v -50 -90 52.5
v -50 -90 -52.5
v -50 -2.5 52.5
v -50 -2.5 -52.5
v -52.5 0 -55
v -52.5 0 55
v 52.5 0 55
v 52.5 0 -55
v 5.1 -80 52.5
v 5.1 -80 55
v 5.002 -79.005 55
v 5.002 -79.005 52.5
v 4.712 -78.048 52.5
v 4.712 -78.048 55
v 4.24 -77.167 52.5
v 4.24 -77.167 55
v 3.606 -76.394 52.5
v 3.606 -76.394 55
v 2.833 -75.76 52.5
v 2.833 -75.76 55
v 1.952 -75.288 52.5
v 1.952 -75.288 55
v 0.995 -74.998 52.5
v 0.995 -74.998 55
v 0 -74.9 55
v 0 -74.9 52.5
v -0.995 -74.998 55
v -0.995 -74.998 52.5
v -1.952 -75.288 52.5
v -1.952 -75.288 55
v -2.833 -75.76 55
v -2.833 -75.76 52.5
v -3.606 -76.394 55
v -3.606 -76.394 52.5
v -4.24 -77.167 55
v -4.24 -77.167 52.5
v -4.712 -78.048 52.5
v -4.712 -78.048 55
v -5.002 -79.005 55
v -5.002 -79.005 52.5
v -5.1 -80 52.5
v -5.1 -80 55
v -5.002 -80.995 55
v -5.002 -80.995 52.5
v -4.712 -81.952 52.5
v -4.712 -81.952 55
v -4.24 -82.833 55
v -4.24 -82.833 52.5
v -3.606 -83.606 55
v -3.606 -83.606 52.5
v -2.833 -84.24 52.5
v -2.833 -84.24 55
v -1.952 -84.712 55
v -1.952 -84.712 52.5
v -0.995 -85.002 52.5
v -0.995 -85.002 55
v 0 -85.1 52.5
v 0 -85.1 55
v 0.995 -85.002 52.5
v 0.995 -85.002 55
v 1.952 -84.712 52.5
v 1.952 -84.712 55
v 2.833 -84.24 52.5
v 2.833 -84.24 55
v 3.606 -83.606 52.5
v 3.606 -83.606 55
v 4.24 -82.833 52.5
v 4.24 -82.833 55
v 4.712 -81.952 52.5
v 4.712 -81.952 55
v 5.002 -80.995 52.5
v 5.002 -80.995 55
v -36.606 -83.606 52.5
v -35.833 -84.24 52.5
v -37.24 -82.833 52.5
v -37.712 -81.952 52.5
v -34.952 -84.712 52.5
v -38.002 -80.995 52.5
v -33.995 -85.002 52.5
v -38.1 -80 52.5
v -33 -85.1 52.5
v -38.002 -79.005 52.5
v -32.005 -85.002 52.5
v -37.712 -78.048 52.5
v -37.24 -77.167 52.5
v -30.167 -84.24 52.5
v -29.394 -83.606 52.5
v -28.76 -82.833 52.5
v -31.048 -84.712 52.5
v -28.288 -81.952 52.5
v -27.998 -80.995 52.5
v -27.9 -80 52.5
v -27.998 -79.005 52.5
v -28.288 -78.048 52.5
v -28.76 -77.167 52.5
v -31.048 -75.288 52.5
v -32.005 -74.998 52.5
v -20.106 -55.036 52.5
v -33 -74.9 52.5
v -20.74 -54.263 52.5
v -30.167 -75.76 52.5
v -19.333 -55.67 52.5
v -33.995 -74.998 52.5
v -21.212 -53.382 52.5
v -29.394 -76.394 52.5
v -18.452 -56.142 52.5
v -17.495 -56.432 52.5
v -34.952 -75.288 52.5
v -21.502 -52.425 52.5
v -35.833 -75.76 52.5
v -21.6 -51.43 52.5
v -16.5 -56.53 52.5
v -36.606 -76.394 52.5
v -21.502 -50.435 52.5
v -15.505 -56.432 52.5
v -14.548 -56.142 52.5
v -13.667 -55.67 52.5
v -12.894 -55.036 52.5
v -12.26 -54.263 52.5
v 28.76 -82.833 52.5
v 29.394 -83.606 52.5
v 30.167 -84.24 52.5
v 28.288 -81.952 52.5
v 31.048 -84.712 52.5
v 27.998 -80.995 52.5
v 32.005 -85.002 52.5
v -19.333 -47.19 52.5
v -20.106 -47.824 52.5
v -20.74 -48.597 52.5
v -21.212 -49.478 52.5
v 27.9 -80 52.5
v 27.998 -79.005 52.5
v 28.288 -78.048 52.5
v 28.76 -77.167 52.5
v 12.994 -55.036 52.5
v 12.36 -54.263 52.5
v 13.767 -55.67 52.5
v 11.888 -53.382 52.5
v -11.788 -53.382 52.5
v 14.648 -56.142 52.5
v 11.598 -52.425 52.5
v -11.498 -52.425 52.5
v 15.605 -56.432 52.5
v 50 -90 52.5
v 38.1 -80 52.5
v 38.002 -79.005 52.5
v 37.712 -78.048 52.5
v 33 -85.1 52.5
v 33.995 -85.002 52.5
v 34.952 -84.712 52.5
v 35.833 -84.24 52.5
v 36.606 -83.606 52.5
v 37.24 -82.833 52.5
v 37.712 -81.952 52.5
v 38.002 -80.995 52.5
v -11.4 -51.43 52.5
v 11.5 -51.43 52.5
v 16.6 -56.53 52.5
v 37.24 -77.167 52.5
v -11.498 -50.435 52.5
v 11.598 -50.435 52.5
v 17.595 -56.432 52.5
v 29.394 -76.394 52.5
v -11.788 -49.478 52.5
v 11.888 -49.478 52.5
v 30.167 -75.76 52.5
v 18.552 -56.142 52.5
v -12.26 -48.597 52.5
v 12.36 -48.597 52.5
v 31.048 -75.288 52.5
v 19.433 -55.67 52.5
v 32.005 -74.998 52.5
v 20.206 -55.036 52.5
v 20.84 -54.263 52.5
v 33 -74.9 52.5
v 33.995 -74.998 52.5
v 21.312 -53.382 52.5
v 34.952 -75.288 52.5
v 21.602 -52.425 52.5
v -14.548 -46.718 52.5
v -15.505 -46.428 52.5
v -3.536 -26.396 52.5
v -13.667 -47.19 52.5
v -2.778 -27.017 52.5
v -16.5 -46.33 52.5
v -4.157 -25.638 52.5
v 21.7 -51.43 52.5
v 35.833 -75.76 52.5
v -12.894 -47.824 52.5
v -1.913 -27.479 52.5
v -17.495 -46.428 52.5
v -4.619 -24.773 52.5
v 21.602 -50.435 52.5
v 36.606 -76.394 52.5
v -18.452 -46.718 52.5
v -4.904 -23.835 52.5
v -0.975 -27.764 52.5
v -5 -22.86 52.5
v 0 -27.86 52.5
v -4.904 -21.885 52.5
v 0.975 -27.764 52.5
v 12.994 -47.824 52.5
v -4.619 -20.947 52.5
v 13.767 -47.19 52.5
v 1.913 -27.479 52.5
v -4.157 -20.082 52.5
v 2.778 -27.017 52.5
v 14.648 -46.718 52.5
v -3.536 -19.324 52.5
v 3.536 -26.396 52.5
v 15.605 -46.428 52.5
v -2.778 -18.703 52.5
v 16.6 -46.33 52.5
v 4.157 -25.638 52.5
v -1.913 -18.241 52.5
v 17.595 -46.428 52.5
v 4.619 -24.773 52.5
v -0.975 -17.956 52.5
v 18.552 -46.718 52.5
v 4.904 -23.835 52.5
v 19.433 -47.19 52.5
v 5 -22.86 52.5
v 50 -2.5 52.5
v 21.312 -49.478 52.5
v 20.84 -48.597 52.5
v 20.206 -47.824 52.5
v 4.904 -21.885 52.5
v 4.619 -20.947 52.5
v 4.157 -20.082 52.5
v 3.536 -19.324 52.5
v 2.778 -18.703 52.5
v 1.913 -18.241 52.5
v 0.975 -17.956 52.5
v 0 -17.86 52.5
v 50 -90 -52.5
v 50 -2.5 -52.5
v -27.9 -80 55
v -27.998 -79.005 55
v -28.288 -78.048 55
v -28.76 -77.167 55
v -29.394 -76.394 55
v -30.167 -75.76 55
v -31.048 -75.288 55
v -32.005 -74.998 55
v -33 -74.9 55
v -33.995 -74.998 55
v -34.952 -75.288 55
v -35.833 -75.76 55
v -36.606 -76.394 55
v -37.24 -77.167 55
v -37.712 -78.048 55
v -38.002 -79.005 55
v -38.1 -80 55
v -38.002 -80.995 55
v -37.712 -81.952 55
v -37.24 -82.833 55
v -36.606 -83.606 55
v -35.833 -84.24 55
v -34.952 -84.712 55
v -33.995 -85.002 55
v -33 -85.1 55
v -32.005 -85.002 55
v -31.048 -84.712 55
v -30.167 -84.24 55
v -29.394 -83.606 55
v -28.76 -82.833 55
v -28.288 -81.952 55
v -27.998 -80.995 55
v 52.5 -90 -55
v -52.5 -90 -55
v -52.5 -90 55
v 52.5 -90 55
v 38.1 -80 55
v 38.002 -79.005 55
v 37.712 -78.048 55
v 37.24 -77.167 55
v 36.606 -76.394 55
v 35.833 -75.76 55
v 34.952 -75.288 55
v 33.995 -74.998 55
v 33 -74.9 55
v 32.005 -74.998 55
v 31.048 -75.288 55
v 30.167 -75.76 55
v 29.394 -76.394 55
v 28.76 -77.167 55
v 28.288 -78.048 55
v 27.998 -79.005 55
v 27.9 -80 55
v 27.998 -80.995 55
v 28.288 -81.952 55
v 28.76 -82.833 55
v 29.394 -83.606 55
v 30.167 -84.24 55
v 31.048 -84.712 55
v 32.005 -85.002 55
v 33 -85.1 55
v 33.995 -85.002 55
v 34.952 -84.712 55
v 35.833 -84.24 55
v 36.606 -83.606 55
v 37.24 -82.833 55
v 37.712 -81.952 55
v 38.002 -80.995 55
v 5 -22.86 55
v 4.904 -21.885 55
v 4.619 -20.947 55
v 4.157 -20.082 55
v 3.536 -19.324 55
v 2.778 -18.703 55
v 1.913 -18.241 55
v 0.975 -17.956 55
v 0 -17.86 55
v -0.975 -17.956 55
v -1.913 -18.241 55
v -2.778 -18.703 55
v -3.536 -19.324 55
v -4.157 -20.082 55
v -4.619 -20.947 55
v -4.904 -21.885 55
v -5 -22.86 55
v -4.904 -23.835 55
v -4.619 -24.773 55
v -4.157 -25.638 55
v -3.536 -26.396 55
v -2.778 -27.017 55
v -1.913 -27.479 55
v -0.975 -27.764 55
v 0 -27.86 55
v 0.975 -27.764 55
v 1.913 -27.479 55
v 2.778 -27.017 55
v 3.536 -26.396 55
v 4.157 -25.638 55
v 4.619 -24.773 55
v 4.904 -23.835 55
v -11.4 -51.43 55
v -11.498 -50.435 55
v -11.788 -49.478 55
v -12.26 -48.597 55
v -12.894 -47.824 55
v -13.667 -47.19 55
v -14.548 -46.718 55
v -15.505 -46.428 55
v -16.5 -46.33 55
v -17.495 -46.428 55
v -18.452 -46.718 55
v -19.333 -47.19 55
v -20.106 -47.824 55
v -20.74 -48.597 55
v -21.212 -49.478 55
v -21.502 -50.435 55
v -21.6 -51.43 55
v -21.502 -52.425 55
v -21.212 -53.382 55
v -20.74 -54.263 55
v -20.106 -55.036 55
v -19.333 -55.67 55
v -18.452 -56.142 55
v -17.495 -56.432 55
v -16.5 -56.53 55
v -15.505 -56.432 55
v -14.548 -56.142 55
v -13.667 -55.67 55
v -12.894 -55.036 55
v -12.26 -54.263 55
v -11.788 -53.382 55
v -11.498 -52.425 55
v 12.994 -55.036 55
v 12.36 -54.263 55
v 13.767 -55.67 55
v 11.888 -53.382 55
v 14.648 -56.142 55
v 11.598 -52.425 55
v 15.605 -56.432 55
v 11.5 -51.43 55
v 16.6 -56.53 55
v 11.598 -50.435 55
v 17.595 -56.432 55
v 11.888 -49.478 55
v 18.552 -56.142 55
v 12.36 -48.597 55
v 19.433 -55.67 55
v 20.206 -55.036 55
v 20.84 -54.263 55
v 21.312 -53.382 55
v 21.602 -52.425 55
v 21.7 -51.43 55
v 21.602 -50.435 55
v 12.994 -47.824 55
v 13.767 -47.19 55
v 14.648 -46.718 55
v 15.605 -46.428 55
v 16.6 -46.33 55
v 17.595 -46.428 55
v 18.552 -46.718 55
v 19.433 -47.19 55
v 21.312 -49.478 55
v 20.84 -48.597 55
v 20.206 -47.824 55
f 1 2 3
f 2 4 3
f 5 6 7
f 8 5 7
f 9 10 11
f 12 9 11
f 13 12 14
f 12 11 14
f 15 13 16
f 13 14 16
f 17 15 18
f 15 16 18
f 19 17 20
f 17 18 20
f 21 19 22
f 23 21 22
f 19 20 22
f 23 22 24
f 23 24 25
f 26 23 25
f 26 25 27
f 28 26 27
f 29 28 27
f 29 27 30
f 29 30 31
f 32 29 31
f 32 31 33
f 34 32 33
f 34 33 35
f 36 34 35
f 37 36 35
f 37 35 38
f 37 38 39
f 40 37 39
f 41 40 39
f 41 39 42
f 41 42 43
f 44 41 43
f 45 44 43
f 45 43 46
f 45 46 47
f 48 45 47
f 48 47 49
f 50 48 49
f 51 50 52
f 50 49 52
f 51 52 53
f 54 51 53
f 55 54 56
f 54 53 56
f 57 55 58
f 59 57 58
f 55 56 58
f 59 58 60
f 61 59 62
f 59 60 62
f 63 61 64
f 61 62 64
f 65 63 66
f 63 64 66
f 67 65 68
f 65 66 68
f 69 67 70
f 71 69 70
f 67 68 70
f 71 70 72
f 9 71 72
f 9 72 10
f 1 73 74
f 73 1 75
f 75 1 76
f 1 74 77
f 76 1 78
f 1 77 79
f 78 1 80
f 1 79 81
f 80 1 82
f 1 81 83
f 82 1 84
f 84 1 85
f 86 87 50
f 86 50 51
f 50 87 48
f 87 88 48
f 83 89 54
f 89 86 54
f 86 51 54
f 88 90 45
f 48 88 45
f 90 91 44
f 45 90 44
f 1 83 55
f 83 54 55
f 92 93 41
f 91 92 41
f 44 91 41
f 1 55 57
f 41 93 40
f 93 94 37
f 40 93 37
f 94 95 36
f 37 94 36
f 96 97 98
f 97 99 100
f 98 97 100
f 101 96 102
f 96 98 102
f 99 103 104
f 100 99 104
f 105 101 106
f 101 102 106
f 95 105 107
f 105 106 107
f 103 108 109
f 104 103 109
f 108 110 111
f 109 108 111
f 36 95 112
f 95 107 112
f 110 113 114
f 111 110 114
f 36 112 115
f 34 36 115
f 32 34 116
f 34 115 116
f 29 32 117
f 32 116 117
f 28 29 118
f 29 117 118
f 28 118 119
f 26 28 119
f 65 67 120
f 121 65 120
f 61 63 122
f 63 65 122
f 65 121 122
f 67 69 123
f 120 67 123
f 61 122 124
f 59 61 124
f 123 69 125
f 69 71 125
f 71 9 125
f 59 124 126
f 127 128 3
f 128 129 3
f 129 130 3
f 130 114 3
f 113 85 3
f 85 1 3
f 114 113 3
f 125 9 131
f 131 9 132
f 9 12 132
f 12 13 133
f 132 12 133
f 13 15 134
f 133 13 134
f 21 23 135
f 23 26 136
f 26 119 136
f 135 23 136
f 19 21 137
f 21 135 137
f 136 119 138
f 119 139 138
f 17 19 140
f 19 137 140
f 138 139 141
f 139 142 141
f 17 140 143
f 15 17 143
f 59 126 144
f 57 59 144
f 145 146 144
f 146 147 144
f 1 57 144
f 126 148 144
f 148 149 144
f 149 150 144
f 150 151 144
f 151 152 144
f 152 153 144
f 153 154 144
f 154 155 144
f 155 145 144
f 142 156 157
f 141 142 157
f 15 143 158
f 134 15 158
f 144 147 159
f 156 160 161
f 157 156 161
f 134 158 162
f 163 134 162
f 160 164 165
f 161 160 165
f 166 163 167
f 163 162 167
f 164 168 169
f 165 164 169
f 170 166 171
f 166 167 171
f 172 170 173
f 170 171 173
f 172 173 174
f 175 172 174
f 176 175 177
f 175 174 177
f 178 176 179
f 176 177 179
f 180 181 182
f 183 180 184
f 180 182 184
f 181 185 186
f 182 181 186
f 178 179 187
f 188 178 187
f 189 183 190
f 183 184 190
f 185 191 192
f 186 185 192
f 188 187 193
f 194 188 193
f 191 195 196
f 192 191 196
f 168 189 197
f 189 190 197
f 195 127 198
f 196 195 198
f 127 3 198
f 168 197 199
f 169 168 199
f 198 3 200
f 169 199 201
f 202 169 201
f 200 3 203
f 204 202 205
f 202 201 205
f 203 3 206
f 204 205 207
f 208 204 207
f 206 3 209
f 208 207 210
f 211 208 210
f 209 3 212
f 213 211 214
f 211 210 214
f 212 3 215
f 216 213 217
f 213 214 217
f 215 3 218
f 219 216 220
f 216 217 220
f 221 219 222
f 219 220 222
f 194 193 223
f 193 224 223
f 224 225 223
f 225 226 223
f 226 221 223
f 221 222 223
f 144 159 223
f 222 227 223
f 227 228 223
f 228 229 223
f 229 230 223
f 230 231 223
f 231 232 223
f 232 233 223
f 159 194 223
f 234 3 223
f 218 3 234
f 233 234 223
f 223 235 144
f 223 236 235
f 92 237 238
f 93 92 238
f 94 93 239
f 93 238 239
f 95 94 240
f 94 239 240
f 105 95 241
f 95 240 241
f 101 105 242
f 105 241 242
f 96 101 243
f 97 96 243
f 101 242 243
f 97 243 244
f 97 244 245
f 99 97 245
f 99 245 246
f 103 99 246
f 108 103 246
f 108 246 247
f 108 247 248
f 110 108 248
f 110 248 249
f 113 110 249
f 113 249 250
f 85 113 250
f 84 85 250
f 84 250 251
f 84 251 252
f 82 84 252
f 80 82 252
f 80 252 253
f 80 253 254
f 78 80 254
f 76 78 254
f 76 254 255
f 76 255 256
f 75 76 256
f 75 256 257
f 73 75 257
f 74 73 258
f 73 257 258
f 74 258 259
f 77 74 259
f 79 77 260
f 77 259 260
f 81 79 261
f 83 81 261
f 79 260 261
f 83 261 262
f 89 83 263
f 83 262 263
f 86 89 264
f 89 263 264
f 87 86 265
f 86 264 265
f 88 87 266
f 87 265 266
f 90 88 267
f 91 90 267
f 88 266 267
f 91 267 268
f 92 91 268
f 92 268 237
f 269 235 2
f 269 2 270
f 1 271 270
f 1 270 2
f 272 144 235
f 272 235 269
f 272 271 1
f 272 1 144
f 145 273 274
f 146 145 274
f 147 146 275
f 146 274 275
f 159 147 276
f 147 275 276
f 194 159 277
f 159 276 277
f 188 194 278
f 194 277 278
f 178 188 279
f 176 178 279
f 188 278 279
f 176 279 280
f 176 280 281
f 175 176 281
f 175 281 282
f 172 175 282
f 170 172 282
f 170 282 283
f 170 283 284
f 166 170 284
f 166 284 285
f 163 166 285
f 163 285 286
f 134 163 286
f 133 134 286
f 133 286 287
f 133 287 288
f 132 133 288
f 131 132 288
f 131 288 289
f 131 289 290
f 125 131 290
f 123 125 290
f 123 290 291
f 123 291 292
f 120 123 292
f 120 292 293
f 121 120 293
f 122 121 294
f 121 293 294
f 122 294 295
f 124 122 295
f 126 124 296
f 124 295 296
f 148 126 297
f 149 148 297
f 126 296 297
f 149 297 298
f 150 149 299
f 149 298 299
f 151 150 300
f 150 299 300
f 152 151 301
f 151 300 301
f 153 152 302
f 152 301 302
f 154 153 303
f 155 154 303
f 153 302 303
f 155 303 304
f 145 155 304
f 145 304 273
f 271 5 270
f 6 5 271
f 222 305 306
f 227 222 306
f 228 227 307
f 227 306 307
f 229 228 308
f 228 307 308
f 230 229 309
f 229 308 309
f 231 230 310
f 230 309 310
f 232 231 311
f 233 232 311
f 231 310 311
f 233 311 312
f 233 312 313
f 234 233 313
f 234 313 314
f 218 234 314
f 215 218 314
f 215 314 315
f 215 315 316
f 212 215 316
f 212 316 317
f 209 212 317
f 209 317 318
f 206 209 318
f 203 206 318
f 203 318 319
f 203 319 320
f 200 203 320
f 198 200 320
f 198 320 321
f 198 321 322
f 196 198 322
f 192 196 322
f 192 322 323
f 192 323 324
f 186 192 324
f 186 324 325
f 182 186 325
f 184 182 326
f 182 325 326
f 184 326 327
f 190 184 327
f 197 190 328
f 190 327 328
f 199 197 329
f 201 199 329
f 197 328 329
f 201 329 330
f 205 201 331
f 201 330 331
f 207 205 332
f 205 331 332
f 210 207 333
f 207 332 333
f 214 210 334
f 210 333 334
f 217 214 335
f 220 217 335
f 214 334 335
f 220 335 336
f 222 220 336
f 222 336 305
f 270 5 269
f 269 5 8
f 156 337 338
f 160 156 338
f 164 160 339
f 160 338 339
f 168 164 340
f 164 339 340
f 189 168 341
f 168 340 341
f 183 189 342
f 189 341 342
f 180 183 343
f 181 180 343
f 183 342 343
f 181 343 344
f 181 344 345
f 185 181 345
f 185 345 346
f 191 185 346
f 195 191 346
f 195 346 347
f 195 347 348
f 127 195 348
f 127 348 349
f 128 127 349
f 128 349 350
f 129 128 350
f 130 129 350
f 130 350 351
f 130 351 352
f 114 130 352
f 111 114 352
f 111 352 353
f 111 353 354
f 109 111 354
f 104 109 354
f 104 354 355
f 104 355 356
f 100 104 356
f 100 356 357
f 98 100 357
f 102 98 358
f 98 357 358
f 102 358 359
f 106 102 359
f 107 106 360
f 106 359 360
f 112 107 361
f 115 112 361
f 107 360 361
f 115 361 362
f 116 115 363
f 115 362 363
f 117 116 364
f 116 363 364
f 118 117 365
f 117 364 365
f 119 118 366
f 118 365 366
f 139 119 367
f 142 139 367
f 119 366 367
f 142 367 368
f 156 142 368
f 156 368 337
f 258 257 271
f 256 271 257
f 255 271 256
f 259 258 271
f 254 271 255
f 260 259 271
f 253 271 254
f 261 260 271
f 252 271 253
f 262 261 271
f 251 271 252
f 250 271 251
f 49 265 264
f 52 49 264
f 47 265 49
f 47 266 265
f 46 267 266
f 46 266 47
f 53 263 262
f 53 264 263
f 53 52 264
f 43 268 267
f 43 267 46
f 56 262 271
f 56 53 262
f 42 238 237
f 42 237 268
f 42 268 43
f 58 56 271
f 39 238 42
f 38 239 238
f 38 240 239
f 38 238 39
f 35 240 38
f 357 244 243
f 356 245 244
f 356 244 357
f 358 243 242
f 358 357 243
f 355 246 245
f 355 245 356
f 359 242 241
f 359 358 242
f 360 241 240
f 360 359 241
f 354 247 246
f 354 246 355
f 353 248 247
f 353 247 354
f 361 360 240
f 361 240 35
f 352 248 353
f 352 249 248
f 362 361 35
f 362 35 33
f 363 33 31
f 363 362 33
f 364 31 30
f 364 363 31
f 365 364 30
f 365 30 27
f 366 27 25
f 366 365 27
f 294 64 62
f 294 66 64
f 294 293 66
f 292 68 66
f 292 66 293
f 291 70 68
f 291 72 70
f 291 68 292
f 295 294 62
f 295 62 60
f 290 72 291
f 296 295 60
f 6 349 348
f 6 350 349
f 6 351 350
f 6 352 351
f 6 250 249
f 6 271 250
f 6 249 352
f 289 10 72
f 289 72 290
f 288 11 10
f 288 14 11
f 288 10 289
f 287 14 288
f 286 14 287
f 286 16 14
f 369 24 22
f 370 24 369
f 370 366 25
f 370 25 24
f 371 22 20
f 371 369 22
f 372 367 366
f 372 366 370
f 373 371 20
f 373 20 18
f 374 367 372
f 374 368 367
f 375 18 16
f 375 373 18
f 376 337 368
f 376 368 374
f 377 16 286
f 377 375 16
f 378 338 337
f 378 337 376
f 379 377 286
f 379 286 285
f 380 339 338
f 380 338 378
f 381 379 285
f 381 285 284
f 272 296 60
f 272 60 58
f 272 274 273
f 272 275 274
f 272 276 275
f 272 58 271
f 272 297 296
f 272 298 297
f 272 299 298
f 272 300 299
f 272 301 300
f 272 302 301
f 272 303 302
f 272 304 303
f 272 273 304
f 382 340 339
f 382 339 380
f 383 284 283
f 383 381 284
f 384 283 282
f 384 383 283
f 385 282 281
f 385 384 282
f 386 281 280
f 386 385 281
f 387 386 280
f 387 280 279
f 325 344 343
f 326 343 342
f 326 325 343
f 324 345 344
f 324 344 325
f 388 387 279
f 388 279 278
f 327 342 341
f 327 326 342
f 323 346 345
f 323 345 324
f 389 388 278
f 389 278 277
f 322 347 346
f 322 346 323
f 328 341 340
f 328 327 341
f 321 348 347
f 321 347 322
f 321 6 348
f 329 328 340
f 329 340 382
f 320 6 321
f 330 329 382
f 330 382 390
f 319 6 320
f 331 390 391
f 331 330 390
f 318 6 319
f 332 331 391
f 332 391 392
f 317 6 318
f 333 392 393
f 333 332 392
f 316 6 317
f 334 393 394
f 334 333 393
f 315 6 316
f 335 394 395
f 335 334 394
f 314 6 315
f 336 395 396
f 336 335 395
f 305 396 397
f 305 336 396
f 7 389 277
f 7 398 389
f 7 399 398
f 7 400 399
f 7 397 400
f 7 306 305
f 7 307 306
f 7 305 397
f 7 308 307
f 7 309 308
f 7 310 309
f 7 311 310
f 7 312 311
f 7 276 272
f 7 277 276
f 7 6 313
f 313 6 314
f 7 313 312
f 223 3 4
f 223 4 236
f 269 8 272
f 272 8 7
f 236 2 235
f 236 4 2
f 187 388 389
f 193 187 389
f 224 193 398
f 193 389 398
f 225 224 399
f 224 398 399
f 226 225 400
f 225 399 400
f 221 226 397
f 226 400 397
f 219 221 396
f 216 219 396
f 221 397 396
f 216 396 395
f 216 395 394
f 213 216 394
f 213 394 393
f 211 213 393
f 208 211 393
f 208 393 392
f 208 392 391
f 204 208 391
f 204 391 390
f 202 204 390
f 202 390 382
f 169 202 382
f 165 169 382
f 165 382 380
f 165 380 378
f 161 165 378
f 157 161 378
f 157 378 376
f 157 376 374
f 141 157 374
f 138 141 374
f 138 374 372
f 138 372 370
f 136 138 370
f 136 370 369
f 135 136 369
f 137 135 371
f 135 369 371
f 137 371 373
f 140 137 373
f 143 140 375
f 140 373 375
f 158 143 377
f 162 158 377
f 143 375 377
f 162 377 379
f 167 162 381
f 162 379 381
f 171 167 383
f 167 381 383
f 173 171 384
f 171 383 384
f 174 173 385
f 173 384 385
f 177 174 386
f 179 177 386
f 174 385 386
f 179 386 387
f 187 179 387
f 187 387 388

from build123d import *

# Parameters (mm, degrees)
F0_W     = 105
F0_H     = 110
F1_DEPTH = 90
F2_T     = -2.5
F3_R     = 5.1
F3_R_2   = 5
F4_DEPTH = 25


with BuildPart() as f1:
    # F0 (on Front) → F1 (new body)
    with BuildSketch(Plane.XZ):
        Rectangle(F0_W, F0_H)
    extrude(amount=F1_DEPTH)

    # F2
    f2_openings = [f1.faces().sort_by_distance(p)[0] for p in [
        (0, -90, 0),
    ]]
    offset(amount=F2_T, openings=f2_openings)

    # F3 (on face) → F4 (cut)
    with BuildSketch(Plane.XY.offset(55)):
        with Locations((16.6, -51.43)):
            Circle(F3_R)
        with Locations((33, -80)):
            Circle(F3_R)
        with Locations((0, -80)):
            Circle(F3_R)
        with Locations((-33, -80)):
            Circle(F3_R)
        with Locations((-16.5, -51.43)):
            Circle(F3_R)
        with Locations((0, -22.86)):
            Circle(F3_R_2)
    extrude(amount=-F4_DEPTH, mode=Mode.SUBTRACT)


solid = f1.part
